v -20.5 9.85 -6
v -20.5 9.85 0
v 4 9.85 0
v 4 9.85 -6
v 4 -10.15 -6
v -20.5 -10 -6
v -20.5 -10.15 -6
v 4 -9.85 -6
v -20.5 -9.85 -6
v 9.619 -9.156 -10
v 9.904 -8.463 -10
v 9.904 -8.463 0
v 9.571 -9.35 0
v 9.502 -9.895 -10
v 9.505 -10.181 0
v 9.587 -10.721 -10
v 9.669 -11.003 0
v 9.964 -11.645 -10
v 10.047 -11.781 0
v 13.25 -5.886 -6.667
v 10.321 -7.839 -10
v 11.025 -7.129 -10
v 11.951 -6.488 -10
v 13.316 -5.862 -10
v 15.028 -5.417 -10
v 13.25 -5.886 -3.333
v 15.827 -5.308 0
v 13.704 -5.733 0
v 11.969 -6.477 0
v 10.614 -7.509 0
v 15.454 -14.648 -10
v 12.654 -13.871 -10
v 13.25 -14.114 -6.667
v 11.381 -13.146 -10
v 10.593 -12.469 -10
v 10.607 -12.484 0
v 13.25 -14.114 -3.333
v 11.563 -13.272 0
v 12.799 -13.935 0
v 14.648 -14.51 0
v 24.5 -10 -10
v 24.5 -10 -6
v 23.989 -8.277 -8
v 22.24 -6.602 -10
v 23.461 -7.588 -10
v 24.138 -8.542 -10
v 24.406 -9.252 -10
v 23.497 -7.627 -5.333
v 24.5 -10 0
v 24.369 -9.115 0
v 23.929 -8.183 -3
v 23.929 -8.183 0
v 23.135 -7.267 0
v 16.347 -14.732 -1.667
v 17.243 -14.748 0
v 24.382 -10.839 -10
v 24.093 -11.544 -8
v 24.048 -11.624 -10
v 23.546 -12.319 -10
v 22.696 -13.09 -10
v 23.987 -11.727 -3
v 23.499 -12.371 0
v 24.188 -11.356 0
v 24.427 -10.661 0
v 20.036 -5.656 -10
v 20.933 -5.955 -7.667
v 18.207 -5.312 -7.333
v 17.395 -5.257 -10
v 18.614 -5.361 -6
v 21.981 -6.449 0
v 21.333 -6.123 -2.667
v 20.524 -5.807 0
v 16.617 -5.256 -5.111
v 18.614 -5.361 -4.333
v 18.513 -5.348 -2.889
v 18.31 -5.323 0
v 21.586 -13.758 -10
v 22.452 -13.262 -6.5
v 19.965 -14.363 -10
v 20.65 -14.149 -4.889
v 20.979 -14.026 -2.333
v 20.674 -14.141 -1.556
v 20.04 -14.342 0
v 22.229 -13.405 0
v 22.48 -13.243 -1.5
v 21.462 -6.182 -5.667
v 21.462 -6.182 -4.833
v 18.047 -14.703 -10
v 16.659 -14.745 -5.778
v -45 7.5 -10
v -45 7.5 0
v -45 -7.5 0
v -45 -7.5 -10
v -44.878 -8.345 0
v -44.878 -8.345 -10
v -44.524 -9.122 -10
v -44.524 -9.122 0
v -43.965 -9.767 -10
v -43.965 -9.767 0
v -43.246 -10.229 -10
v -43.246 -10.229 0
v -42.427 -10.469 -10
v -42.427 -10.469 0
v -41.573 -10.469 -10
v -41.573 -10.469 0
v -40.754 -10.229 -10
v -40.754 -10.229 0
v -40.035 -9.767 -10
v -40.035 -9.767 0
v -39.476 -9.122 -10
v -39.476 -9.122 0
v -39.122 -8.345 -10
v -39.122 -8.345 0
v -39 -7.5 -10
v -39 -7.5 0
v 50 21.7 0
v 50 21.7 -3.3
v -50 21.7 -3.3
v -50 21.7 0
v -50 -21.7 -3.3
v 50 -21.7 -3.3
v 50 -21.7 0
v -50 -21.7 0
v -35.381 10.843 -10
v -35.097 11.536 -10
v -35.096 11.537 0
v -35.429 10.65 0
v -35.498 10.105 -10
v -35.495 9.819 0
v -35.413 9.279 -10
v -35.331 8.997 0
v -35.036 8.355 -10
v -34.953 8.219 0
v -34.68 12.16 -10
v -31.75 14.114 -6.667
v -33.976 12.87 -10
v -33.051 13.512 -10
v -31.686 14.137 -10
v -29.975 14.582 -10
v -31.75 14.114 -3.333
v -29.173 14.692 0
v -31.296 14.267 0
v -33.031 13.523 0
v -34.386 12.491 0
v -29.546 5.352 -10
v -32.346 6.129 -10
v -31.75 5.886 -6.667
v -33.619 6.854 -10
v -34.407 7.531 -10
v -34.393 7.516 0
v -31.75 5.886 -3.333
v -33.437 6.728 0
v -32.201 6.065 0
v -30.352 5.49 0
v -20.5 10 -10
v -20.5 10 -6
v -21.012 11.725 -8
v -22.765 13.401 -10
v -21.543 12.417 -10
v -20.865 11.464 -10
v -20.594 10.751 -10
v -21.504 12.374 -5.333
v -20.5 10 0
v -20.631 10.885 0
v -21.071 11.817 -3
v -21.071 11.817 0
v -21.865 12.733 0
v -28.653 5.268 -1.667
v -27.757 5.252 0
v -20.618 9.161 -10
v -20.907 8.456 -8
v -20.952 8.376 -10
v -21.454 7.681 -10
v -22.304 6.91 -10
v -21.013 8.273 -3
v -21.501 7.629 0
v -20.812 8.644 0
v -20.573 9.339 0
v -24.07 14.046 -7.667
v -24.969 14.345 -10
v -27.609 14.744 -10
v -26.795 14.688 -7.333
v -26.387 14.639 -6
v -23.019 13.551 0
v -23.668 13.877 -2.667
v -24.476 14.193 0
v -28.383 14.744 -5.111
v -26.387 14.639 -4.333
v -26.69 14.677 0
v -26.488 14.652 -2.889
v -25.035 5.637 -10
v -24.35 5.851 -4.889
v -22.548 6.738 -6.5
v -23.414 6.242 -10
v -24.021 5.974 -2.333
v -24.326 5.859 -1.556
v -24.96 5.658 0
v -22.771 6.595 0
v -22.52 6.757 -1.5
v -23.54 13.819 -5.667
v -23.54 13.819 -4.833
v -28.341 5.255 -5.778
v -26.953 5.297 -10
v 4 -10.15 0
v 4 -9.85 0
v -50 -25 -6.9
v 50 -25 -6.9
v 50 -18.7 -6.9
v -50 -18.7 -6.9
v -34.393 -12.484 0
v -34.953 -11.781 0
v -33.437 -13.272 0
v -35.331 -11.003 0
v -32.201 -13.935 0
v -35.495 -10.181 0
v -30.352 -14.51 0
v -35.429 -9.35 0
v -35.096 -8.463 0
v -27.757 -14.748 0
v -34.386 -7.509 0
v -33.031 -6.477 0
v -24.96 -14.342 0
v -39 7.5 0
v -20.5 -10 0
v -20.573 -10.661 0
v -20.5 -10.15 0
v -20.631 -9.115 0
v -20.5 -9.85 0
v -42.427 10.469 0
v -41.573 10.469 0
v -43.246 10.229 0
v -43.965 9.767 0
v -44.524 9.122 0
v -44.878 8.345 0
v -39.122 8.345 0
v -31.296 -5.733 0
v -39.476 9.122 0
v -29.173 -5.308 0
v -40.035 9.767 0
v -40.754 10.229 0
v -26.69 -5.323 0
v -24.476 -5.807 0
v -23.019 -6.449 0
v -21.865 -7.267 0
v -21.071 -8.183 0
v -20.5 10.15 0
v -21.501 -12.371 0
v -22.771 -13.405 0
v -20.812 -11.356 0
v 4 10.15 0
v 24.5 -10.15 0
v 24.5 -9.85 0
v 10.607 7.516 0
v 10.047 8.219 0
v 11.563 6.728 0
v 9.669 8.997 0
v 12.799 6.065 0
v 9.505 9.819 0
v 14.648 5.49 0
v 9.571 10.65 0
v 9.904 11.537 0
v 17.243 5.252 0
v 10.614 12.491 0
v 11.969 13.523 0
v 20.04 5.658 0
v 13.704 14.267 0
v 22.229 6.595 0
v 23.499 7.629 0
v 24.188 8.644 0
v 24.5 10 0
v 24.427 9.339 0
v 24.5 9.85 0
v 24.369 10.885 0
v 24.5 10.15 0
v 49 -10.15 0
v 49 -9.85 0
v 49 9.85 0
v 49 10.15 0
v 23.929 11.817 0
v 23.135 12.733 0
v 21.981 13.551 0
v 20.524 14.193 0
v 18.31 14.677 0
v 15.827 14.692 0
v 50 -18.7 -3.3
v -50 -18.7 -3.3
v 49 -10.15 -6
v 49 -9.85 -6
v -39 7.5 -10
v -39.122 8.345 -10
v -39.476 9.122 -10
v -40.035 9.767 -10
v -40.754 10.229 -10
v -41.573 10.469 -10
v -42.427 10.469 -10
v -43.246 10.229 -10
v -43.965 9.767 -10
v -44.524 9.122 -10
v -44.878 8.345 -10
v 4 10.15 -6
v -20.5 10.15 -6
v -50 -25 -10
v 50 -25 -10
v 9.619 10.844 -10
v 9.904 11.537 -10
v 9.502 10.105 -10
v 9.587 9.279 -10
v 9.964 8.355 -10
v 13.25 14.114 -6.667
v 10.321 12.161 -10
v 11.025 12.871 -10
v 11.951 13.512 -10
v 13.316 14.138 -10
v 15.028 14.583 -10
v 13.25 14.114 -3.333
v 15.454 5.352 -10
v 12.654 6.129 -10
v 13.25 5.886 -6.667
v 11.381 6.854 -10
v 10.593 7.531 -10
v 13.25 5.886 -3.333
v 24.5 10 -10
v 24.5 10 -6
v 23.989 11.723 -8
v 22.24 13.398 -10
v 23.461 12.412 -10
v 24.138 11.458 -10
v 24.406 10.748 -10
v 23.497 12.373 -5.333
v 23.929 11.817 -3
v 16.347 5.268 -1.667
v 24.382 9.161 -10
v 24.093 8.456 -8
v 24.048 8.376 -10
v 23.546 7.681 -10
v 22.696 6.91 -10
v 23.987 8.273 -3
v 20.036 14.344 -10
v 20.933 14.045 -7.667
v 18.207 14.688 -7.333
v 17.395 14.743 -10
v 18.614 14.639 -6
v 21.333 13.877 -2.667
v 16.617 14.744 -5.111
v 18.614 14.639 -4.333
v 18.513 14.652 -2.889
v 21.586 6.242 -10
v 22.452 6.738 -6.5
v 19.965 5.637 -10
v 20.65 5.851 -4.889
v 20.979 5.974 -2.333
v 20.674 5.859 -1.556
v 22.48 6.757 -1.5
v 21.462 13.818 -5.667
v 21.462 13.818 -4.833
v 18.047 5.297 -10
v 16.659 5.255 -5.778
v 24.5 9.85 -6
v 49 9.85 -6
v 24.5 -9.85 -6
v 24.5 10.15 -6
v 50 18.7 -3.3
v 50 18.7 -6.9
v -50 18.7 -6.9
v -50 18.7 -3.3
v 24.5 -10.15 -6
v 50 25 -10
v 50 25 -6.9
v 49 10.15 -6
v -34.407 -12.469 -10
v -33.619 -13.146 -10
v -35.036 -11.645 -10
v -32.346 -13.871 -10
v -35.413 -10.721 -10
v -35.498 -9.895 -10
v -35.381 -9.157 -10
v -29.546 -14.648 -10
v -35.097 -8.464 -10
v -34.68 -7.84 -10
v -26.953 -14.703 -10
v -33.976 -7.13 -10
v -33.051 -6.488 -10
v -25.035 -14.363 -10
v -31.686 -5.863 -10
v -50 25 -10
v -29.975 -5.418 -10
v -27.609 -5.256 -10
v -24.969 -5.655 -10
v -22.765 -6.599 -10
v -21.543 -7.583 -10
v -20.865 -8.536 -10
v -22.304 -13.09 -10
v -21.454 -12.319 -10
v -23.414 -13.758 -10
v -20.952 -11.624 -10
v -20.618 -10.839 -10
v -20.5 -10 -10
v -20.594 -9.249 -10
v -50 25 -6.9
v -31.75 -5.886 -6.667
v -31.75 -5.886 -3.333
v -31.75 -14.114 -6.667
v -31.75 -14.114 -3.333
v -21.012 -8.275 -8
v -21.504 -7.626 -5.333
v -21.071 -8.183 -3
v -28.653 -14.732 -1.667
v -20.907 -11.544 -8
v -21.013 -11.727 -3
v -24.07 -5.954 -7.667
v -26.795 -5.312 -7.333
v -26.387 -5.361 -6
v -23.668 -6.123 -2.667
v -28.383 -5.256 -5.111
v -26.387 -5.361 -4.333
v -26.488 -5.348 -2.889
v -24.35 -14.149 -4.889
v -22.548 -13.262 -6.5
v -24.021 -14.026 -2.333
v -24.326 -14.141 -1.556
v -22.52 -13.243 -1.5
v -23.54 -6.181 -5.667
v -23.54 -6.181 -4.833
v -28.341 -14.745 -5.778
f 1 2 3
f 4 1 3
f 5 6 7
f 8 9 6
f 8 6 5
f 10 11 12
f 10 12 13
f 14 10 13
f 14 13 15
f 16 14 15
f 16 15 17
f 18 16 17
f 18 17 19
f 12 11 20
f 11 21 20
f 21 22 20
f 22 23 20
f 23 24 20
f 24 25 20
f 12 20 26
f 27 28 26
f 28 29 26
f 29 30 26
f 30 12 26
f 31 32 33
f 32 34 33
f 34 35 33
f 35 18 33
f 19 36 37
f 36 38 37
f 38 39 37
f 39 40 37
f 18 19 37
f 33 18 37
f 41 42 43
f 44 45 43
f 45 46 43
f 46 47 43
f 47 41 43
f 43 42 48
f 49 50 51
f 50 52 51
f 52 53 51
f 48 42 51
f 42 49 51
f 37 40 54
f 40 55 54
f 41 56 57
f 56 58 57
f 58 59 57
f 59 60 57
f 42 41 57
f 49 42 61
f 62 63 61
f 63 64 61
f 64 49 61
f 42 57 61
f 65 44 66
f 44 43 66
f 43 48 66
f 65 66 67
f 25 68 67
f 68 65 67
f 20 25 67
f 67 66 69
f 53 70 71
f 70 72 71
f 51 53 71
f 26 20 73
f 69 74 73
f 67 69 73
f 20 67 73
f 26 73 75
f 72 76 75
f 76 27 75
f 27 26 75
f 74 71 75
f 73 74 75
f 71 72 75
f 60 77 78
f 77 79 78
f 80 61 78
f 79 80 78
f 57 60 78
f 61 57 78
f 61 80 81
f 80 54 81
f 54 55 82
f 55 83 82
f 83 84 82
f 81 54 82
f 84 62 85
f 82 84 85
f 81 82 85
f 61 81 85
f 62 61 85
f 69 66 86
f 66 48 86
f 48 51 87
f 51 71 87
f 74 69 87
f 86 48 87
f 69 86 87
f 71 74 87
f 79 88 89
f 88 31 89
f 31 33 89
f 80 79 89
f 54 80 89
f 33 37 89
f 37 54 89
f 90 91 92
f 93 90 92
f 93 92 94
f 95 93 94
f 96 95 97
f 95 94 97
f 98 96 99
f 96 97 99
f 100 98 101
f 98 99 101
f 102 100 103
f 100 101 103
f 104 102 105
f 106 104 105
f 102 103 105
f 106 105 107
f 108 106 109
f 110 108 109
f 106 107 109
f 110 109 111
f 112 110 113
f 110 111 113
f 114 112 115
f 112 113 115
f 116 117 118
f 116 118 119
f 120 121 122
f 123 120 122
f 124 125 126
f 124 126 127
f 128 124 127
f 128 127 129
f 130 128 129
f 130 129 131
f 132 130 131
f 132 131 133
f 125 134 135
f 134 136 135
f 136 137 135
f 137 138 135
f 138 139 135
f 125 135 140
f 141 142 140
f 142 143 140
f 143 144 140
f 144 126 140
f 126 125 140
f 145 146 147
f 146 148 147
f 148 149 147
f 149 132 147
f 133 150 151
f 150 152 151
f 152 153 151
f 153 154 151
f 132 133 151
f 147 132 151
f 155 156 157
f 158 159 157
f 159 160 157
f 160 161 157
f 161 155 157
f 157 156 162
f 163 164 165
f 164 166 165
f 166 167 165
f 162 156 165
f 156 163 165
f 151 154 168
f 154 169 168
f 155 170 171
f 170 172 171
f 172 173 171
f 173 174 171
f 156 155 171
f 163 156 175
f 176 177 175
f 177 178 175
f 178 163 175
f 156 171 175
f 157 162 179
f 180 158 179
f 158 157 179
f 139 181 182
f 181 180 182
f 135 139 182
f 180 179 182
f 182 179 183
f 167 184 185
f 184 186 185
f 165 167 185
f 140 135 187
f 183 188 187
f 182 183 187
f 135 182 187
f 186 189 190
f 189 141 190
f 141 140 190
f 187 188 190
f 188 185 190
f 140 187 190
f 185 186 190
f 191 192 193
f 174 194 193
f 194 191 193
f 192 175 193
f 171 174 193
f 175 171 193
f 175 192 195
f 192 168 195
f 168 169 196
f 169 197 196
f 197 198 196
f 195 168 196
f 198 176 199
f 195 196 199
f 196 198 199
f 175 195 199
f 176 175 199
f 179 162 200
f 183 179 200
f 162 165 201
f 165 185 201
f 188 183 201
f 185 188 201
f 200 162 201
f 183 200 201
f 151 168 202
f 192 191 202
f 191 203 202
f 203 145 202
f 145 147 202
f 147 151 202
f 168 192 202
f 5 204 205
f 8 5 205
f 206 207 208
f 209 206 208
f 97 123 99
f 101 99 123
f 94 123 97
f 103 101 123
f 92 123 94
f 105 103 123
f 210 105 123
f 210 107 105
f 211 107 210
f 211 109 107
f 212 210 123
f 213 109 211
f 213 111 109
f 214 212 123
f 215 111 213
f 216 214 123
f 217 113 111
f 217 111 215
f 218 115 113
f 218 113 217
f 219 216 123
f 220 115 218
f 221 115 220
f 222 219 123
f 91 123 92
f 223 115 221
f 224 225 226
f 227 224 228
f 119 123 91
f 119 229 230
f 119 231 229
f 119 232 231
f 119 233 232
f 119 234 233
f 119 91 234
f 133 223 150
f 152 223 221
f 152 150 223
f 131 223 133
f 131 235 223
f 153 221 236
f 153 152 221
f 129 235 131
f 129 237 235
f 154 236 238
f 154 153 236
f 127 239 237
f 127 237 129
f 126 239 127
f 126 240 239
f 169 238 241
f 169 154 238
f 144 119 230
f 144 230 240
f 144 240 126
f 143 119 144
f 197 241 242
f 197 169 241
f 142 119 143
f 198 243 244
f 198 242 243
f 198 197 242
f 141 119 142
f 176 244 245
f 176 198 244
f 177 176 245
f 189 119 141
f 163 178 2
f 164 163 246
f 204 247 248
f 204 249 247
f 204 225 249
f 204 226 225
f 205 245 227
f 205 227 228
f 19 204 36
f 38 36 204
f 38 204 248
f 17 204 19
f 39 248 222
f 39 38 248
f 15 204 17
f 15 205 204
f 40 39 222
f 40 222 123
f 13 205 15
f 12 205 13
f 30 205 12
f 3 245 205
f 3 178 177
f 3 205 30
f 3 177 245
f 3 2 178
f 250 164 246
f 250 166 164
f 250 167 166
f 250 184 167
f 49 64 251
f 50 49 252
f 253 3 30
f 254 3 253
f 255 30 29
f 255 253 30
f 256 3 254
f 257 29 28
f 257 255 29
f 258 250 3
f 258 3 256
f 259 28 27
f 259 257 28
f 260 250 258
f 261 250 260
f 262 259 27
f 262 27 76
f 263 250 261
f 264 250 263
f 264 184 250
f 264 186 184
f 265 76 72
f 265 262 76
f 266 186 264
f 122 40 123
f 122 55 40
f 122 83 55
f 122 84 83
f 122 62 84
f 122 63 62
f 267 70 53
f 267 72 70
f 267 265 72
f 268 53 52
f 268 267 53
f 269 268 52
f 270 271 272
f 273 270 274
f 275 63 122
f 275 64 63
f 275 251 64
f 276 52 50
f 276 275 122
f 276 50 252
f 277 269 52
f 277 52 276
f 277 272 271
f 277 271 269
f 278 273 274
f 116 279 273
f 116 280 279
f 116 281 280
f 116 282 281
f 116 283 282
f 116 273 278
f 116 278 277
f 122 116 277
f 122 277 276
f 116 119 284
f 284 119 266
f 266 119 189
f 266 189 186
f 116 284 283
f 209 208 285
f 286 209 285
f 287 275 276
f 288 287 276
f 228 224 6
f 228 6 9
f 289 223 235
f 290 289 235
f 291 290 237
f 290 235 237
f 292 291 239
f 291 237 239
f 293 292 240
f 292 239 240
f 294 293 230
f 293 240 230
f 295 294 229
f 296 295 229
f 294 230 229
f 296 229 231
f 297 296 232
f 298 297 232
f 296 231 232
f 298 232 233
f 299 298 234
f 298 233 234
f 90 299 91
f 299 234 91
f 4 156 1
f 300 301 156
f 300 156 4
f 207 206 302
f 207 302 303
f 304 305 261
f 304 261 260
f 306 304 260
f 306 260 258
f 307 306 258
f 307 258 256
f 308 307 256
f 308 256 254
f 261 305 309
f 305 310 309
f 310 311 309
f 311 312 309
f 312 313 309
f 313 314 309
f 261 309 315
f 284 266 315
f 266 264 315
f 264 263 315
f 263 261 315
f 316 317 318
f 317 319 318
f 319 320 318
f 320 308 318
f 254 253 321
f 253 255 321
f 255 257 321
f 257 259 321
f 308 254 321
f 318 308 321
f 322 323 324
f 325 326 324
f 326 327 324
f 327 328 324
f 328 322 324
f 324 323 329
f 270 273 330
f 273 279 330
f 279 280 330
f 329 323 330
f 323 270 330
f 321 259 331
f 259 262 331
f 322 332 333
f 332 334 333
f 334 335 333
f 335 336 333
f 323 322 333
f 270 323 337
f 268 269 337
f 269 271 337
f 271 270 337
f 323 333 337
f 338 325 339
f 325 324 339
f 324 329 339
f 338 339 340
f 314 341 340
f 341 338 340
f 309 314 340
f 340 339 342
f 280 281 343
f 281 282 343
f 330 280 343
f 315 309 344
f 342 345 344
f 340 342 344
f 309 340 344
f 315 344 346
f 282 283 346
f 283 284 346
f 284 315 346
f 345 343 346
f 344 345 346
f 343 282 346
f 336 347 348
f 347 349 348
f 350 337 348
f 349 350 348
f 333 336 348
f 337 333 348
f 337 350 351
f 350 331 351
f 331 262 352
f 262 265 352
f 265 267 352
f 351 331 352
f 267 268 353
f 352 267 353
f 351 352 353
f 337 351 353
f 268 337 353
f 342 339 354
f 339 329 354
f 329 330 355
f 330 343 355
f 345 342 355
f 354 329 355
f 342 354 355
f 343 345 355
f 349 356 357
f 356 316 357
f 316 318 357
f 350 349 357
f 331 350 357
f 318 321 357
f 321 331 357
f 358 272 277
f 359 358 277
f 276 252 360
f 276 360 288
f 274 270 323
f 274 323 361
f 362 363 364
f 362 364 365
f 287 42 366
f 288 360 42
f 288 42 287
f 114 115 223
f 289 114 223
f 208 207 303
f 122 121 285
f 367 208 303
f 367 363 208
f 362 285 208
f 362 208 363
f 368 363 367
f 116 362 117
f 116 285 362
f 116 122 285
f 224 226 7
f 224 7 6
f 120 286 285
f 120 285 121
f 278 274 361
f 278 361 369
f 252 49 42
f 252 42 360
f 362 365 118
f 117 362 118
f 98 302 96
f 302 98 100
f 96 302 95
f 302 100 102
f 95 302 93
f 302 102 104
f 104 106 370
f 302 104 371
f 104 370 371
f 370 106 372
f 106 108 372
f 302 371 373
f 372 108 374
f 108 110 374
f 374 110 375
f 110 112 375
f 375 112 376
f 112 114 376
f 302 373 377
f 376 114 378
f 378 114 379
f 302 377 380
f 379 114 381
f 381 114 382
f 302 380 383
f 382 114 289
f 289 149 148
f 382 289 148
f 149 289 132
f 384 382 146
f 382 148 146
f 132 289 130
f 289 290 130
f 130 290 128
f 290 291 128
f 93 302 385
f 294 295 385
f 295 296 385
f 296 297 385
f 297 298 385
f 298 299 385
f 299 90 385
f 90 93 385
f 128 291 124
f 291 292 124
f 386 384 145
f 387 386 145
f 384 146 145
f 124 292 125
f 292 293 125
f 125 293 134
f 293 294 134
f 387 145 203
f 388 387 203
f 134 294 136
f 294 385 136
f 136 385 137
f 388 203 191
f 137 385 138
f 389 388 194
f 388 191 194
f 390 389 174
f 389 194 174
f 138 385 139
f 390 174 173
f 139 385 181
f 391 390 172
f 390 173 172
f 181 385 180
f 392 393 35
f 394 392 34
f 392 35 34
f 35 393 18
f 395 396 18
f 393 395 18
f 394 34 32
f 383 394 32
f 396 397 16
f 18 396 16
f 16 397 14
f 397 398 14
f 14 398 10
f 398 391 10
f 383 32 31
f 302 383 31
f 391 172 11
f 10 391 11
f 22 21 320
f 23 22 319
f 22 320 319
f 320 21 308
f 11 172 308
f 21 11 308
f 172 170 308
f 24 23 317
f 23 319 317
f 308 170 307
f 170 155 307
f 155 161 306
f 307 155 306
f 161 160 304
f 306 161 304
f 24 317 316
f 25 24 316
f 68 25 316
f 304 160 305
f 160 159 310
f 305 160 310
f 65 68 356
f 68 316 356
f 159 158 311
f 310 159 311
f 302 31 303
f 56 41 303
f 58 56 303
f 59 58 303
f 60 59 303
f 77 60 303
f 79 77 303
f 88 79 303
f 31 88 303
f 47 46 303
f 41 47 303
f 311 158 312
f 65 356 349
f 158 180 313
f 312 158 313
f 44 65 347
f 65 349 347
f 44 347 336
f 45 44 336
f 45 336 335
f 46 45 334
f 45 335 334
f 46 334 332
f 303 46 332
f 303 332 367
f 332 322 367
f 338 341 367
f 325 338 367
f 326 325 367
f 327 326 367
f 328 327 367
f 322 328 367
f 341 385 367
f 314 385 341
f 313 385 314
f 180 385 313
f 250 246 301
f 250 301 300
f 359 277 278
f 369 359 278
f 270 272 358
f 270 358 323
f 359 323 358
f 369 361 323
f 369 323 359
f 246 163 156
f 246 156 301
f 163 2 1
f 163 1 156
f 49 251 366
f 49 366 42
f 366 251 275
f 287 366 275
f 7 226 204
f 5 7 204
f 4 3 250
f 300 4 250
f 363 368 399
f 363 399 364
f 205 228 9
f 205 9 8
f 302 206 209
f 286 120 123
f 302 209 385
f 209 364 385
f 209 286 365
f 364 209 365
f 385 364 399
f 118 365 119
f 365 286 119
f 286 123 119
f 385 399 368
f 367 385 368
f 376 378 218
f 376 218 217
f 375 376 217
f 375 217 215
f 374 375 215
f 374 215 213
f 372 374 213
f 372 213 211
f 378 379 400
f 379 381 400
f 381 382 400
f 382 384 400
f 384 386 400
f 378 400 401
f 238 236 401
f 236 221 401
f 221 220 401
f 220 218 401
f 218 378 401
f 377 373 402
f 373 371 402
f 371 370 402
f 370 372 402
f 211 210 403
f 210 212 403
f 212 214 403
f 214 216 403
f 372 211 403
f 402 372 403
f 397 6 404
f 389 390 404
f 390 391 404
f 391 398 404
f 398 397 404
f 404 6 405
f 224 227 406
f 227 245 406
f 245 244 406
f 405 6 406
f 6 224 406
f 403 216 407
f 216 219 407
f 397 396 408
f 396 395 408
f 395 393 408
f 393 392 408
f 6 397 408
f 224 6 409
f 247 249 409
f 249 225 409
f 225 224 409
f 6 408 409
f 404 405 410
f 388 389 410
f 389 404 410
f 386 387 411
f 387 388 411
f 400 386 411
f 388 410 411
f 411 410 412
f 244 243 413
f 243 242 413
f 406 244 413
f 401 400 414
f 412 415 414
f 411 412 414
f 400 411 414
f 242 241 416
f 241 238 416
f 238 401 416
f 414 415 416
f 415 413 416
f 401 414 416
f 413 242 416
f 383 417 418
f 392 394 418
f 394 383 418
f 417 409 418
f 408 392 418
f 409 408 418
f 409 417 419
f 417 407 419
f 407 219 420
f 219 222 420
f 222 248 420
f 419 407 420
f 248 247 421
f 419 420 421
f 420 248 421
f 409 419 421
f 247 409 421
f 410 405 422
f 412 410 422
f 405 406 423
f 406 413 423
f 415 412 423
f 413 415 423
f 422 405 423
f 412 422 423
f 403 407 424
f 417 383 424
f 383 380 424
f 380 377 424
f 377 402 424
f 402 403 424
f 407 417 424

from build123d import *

# Parameters (mm, degrees)
SKETCH_W             = 100
SKETCH_H             = 50
PAD_DEPTH            = 10
POCKET_DEPTH         = 21
POCKET001_DEPTH      = 274.500444
POCKET001_DEPTH_BACK = 274.500444
POCKET002_DEPTH      = 10.001
SKETCH005_W          = 24.5
SKETCH005_H          = 0.3
POCKET003_DEPTH      = 6


with BuildPart() as part:
    # Sketch → Pad (new body)
    with BuildSketch(Plane.XY):
        Rectangle(SKETCH_W, SKETCH_H)
    extrude(amount=-PAD_DEPTH)

    # Sketch001 → Pocket (cut)
    with BuildSketch(Plane.XY):
        with BuildLine():
            add(Edge.make_bspline(
                [(-20.5, 10), (-20.5, 18.227241), (-31.75, 14.113621), (-43, 10), (-31.75, 5.886379), (-20.5, 1.772759), (-20.5, 10)],
                knots=[0, 0, 0, 2.094395, 2.094395, 4.18879, 4.18879, 6.283185, 6.283185, 6.283185], degree=2, weights=[1, 0.5, 1, 0.5, 1, 0.5, 1]))
        make_face()
        with BuildLine():
            add(Edge.make_bspline(
                [(24.5, 10), (24.5, 18.227241), (13.25, 14.113621), (2, 10), (13.25, 5.886379), (24.5, 1.772759), (24.5, 10)],
                knots=[0, 0, 0, 2.094395, 2.094395, 4.18879, 4.18879, 6.283185, 6.283185, 6.283185], degree=2, weights=[1, 0.5, 1, 0.5, 1, 0.5, 1]))
        make_face()
        with BuildLine():
            add(Edge.make_bspline(
                [(-20.5, -10), (-20.5, -1.772759), (-31.75, -5.886379), (-43, -10), (-31.75, -14.113621), (-20.5, -18.227241), (-20.5, -10)],
                knots=[0, 0, 0, 2.094395, 2.094395, 4.18879, 4.18879, 6.283185, 6.283185, 6.283185], degree=2, weights=[1, 0.5, 1, 0.5, 1, 0.5, 1]))
        make_face()
        with BuildLine():
            add(Edge.make_bspline(
                [(24.5, -10), (24.5, -1.772759), (13.25, -5.886379), (2, -10), (13.25, -14.113621), (24.5, -18.227241), (24.5, -10)],
                knots=[0, 0, 0, 2.094395, 2.094395, 4.18879, 4.18879, 6.283185, 6.283185, 6.283185], degree=2, weights=[1, 0.5, 1, 0.5, 1, 0.5, 1]))
        make_face()
    extrude(amount=-POCKET_DEPTH, mode=Mode.SUBTRACT)

    # Sketch003 → Pocket001 (cut, two sides)
    with BuildSketch(Plane.YZ) as pocket001_sk:
        Polygon((-25, 0), (-25, -6.9), (-18.7, -6.9), (-18.7, -3.3), (-21.7, -3.3), (-21.7, 0), align=None)
    pocket001 = extrude(amount=-POCKET001_DEPTH, mode=Mode.SUBTRACT) + extrude(pocket001_sk.sketch, amount=POCKET001_DEPTH_BACK, mode=Mode.SUBTRACT)

    # Mirrored: Pocket001 across Sketch003 V_Axis
    add(pocket001.mirror(Plane(origin=(0, 0, 0), x_dir=(1, 0, 0), z_dir=(0, 1, 0))), mode=Mode.SUBTRACT)

    # Sketch004 → Pocket002 (cut, through all)
    with BuildSketch(Plane.XY):
        with BuildLine():
            ThreePointArc((-39, 7.5), (-42, 10.5), (-45, 7.5))
            Line((-45, 7.5), (-45, -7.5))
            ThreePointArc((-45, -7.5), (-42, -10.5), (-39, -7.5))
            Line((-39, -7.5), (-39, 7.5))
        make_face()
    extrude(amount=-POCKET002_DEPTH, mode=Mode.SUBTRACT)

    # Sketch005 → Pocket003 (cut)
    with BuildSketch(Plane.XY):
        with Locations((-8.25, 10)):
            Rectangle(SKETCH005_W, SKETCH005_H)
        with Locations((36.75, 10)):
            Rectangle(SKETCH005_W, SKETCH005_H)
        with Locations((-8.25, -10)):
            Rectangle(SKETCH005_W, SKETCH005_H)
        with Locations((36.75, -10)):
            Rectangle(SKETCH005_W, SKETCH005_H)
    extrude(amount=-POCKET003_DEPTH, mode=Mode.SUBTRACT)


solid = part.part
